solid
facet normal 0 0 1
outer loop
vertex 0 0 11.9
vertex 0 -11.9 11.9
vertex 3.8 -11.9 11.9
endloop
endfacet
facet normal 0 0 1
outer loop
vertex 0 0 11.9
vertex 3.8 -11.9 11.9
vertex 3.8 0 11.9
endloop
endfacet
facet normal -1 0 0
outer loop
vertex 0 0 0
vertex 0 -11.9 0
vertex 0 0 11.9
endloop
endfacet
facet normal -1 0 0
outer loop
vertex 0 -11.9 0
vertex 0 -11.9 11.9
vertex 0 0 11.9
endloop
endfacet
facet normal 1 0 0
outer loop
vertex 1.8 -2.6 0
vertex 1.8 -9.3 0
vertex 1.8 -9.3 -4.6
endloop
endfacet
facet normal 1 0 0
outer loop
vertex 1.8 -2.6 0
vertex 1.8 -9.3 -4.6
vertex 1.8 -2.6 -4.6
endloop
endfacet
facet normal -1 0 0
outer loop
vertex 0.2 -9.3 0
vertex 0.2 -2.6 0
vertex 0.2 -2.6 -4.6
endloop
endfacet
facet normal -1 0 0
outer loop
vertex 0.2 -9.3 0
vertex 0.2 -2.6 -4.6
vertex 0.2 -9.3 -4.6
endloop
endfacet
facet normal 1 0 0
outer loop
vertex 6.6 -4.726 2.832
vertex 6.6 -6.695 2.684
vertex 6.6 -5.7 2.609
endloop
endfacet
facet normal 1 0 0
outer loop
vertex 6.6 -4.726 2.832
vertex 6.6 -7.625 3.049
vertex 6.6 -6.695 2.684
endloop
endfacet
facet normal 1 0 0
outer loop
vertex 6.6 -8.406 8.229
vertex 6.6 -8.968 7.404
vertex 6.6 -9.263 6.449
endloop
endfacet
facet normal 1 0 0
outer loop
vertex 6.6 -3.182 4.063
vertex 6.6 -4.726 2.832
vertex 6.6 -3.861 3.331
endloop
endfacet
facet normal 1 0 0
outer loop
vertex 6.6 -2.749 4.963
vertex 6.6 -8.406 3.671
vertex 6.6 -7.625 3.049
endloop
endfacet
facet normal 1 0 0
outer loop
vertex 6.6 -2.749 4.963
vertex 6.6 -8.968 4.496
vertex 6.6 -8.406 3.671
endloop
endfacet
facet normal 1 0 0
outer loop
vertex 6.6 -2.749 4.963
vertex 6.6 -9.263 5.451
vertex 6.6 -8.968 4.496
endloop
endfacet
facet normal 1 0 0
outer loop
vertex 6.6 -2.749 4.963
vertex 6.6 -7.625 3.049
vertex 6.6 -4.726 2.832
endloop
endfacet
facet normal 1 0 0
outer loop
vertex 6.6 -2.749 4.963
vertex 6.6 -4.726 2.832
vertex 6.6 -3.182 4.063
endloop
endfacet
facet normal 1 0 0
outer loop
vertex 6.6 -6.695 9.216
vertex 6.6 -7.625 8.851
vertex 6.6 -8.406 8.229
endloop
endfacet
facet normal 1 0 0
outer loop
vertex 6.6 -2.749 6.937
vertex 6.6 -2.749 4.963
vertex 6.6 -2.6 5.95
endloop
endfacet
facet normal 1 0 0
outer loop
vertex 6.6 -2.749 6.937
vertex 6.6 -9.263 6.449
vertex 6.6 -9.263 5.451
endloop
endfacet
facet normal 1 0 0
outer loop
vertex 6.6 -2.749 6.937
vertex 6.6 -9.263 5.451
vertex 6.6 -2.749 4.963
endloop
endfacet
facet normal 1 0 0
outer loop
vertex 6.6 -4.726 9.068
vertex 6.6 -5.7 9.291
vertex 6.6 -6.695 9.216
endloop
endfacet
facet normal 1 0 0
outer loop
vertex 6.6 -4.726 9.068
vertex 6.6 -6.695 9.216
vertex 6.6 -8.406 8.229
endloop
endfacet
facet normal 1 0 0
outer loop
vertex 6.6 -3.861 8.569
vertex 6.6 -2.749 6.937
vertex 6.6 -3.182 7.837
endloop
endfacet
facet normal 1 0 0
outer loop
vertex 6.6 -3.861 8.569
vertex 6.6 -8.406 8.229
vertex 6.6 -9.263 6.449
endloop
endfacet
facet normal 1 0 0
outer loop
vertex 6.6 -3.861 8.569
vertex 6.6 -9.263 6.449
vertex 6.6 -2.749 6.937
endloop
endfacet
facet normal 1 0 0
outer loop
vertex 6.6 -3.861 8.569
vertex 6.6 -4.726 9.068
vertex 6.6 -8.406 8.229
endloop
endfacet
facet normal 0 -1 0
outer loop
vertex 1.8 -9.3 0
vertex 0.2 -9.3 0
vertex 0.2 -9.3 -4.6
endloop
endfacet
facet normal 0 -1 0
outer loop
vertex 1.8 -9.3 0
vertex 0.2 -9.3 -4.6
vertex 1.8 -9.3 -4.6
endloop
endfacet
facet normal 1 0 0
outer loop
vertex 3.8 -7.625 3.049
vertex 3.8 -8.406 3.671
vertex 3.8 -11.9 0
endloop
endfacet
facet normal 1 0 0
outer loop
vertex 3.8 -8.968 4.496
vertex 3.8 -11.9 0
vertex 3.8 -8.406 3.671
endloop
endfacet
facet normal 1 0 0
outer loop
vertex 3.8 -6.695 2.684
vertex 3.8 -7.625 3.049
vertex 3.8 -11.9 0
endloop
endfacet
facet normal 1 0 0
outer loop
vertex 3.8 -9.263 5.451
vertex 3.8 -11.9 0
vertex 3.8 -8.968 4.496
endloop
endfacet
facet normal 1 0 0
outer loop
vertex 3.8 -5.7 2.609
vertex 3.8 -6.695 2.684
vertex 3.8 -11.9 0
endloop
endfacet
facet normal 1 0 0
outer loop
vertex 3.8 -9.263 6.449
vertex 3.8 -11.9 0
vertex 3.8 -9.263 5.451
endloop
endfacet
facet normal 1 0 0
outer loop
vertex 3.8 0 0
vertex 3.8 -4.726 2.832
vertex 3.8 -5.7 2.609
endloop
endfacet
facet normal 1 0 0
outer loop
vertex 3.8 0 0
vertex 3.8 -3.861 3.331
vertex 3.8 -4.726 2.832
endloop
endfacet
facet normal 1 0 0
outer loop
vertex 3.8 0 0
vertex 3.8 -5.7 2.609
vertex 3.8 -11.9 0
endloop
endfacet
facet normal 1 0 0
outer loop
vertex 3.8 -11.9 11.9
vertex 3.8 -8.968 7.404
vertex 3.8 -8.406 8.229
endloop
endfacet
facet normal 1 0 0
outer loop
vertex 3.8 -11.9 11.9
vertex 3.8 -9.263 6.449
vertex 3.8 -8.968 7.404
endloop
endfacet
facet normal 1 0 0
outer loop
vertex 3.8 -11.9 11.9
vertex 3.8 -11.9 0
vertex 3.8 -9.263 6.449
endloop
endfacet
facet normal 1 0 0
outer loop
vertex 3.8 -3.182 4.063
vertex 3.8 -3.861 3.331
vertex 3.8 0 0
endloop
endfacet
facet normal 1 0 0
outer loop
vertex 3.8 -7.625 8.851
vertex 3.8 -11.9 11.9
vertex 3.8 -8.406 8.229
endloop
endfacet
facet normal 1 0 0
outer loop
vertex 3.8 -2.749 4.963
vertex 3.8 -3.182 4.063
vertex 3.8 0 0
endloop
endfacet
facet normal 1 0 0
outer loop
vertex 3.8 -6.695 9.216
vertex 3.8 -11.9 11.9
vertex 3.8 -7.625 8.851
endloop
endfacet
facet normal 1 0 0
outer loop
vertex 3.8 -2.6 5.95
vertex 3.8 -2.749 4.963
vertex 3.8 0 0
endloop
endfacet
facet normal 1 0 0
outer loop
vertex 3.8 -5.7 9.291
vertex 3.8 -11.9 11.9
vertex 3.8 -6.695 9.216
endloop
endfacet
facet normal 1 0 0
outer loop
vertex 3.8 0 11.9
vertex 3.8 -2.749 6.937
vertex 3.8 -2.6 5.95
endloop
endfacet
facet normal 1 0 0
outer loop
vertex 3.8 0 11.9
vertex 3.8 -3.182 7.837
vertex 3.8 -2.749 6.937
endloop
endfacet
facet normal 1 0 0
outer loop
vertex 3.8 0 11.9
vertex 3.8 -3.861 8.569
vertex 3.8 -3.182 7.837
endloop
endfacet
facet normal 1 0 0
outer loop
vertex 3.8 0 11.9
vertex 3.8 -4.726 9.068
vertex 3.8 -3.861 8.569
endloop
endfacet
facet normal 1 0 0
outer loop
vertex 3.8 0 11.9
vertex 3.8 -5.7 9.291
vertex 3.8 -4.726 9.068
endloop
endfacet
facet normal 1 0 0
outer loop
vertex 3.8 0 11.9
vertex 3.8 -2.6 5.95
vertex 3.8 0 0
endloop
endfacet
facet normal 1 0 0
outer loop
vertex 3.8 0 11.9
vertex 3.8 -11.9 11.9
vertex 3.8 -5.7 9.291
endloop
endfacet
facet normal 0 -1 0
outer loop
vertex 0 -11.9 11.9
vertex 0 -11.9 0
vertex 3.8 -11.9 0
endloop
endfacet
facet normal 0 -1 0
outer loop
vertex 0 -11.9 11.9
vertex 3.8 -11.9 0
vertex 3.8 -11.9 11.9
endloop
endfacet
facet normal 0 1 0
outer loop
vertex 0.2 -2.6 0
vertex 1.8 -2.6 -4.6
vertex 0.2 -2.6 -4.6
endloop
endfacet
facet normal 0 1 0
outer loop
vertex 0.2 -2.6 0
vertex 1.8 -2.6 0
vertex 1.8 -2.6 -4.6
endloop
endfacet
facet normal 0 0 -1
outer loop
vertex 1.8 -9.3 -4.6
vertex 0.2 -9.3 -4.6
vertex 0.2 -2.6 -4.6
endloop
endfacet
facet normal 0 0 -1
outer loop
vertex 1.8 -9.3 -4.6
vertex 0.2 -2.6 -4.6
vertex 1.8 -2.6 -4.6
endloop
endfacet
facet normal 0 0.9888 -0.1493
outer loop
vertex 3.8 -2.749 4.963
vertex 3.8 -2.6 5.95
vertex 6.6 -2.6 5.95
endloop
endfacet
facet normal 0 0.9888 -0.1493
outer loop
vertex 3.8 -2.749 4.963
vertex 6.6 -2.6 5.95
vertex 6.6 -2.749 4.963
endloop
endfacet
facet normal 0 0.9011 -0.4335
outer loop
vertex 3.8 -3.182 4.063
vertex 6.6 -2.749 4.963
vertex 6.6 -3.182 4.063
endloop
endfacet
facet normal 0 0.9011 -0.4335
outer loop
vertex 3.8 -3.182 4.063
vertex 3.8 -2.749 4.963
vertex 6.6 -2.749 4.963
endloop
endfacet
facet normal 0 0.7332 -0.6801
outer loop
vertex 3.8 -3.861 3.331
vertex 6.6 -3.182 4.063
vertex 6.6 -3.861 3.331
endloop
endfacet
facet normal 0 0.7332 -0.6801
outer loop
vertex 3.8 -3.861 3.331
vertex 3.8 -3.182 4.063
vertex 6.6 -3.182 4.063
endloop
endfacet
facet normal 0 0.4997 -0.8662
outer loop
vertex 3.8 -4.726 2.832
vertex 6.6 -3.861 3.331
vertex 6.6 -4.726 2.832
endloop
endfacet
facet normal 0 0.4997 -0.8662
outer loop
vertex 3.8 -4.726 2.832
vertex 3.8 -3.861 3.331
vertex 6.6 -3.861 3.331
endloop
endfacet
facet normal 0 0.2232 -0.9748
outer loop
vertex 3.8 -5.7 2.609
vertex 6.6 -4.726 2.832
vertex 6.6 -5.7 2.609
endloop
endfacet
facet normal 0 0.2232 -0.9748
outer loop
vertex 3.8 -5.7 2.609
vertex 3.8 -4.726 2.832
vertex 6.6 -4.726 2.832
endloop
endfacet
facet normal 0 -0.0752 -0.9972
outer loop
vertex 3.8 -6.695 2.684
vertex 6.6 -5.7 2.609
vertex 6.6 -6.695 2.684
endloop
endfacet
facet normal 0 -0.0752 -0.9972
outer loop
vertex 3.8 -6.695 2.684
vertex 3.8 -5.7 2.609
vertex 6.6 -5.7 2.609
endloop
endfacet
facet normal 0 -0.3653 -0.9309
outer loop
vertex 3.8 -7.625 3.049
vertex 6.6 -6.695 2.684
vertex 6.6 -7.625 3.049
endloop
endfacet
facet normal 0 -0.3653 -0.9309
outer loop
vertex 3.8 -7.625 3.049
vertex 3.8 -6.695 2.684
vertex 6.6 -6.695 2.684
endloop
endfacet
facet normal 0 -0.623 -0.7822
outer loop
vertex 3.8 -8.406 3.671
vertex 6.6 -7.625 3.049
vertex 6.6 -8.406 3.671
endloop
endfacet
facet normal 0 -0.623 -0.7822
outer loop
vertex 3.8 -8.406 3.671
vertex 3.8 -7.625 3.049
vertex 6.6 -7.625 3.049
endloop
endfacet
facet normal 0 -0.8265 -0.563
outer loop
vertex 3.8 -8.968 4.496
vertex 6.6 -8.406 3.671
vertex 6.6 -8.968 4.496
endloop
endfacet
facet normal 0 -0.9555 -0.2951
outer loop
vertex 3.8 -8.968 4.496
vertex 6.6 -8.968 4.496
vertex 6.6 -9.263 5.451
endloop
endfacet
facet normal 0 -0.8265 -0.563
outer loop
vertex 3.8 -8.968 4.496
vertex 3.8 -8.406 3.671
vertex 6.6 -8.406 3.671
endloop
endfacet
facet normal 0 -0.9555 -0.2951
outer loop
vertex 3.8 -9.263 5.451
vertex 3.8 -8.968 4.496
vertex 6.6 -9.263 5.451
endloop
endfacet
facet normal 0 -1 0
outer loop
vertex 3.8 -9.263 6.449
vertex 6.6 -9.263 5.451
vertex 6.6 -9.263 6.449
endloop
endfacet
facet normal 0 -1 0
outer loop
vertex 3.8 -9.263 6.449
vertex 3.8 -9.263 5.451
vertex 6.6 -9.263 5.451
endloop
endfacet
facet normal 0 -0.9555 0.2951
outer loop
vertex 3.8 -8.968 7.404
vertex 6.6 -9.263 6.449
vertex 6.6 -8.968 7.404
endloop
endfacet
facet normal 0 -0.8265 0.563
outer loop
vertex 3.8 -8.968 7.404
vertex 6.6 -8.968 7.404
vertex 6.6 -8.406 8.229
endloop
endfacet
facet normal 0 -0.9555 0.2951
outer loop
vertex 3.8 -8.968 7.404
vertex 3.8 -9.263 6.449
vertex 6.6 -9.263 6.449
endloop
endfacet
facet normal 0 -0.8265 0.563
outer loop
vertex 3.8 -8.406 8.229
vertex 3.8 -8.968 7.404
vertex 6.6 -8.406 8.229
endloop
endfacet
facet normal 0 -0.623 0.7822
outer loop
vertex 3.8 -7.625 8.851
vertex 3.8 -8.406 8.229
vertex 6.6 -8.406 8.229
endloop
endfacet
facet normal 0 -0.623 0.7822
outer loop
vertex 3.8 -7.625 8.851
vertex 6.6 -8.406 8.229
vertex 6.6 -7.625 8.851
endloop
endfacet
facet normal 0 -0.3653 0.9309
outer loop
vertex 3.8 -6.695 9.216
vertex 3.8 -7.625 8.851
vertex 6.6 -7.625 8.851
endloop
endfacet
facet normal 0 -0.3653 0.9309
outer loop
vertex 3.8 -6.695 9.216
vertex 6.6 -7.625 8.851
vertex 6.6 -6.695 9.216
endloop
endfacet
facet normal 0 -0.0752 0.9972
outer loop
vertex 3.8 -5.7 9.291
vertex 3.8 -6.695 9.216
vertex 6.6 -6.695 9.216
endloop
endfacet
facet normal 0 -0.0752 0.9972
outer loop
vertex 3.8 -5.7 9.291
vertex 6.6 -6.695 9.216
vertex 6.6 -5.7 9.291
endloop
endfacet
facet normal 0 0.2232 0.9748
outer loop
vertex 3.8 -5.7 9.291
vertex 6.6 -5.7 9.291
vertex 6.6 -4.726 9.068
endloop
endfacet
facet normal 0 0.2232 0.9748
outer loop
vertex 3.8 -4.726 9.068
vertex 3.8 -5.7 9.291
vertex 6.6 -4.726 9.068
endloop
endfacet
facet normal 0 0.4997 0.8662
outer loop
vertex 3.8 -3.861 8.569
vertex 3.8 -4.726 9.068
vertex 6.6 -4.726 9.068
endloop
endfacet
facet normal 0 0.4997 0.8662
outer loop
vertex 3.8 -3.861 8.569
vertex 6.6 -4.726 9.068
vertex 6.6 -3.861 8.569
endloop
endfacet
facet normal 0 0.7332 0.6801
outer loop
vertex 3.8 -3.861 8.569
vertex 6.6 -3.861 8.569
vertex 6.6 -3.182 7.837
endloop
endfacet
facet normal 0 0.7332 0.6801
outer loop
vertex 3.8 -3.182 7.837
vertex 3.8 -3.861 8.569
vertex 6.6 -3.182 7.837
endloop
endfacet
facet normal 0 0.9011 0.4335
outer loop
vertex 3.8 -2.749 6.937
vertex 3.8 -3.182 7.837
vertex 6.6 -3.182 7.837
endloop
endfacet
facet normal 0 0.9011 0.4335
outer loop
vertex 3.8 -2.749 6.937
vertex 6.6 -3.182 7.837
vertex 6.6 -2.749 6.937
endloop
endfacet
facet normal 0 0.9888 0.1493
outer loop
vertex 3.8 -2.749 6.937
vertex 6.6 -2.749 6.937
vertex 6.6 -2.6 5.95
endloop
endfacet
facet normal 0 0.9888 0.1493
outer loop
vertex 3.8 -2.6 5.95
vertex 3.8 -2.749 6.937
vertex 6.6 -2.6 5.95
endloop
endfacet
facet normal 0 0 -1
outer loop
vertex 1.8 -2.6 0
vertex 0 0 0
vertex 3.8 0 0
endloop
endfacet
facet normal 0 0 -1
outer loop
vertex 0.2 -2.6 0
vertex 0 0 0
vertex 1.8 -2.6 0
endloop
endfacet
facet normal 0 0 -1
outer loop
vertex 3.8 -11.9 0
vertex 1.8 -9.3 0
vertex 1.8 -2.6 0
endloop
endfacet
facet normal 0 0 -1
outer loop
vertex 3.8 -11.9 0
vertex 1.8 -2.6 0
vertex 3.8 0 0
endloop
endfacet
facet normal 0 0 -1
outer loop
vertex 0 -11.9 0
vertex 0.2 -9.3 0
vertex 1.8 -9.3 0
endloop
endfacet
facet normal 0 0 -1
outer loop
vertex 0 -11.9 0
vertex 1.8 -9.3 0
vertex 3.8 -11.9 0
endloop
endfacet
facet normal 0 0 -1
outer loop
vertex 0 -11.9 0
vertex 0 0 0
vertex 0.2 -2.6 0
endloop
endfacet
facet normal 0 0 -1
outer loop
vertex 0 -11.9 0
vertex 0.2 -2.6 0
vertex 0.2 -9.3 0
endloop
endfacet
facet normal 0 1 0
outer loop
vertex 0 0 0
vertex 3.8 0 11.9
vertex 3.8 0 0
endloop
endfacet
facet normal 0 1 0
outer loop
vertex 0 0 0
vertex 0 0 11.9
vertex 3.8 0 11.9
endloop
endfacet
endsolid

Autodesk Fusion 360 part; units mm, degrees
sketch "Sketch1" plane through (0, 0, 0) normal (1, 0, 0) x (0, 1, 0)
  line L0 (0, 0) -> (-11.9, 0)
  line L1 (-11.9, 0) -> (-11.9, 11.9)
  line L2 (-11.9, 11.9) -> (0, 11.9)
  line L3 (0, 11.9) -> (0, 0)
  dimension "d1" = 11.9
  dimension "d2" = 11.9
extrude "Extrude1" add sketch "Sketch1" along normal blind 3.8
sketch "Sketch2" plane through (3.8, 0, 0) normal (1, 0, 0) x (0, 1, 0)
  line L0 (0, 11.9) -> (-11.9, 11.9)
  line L1 (-11.9, 11.9) -> (-11.9, 0)
  line L2 (-11.9, 0) -> (0, 0)
  line L3 (0, 0) -> (0, 11.9)
  line L4 (-5.95, 11.9) -> (-5.95, 0)
  line L5 (0, 5.95) -> (-11.9, 5.95)
  circle A0 centre (-5.95, 5.95) radius 3.35
  dimension "d5" = 6.7
extrude "Extrude2" add sketch "Sketch2" along normal blind 2.8 contours L4 L5 A0 | L4 L5 A0 | L4 L5 A0 | L4 L5 A0
sketch "Sketch3" plane through (0, 0, 0) normal (0, 0, -1) x (1, 0, 0)
  line L0 (0, 11.9) -> (0, 0)
  line L1 (0, 0) -> (3.8, 0)
  line L2 (3.8, 0) -> (3.8, 11.9)
  line L3 (3.8, 11.9) -> (0, 11.9)
  line L4 (0.2, 9.3) -> (1.8, 9.3)
  line L5 (1.8, 9.3) -> (1.8, 2.6)
  line L6 (1.8, 2.6) -> (0.2, 2.6)
  line L7 (0.2, 2.6) -> (0.2, 9.3)
  dimension "d8" = 2.6
  dimension "d10" = 2.6
  dimension "d11" = 0.2
  dimension "d12" = 2
extrude "Extrude3" add sketch "Sketch3" along normal blind 4.6 contours L4 L5 L6 L7
equation "d10 = d8"
